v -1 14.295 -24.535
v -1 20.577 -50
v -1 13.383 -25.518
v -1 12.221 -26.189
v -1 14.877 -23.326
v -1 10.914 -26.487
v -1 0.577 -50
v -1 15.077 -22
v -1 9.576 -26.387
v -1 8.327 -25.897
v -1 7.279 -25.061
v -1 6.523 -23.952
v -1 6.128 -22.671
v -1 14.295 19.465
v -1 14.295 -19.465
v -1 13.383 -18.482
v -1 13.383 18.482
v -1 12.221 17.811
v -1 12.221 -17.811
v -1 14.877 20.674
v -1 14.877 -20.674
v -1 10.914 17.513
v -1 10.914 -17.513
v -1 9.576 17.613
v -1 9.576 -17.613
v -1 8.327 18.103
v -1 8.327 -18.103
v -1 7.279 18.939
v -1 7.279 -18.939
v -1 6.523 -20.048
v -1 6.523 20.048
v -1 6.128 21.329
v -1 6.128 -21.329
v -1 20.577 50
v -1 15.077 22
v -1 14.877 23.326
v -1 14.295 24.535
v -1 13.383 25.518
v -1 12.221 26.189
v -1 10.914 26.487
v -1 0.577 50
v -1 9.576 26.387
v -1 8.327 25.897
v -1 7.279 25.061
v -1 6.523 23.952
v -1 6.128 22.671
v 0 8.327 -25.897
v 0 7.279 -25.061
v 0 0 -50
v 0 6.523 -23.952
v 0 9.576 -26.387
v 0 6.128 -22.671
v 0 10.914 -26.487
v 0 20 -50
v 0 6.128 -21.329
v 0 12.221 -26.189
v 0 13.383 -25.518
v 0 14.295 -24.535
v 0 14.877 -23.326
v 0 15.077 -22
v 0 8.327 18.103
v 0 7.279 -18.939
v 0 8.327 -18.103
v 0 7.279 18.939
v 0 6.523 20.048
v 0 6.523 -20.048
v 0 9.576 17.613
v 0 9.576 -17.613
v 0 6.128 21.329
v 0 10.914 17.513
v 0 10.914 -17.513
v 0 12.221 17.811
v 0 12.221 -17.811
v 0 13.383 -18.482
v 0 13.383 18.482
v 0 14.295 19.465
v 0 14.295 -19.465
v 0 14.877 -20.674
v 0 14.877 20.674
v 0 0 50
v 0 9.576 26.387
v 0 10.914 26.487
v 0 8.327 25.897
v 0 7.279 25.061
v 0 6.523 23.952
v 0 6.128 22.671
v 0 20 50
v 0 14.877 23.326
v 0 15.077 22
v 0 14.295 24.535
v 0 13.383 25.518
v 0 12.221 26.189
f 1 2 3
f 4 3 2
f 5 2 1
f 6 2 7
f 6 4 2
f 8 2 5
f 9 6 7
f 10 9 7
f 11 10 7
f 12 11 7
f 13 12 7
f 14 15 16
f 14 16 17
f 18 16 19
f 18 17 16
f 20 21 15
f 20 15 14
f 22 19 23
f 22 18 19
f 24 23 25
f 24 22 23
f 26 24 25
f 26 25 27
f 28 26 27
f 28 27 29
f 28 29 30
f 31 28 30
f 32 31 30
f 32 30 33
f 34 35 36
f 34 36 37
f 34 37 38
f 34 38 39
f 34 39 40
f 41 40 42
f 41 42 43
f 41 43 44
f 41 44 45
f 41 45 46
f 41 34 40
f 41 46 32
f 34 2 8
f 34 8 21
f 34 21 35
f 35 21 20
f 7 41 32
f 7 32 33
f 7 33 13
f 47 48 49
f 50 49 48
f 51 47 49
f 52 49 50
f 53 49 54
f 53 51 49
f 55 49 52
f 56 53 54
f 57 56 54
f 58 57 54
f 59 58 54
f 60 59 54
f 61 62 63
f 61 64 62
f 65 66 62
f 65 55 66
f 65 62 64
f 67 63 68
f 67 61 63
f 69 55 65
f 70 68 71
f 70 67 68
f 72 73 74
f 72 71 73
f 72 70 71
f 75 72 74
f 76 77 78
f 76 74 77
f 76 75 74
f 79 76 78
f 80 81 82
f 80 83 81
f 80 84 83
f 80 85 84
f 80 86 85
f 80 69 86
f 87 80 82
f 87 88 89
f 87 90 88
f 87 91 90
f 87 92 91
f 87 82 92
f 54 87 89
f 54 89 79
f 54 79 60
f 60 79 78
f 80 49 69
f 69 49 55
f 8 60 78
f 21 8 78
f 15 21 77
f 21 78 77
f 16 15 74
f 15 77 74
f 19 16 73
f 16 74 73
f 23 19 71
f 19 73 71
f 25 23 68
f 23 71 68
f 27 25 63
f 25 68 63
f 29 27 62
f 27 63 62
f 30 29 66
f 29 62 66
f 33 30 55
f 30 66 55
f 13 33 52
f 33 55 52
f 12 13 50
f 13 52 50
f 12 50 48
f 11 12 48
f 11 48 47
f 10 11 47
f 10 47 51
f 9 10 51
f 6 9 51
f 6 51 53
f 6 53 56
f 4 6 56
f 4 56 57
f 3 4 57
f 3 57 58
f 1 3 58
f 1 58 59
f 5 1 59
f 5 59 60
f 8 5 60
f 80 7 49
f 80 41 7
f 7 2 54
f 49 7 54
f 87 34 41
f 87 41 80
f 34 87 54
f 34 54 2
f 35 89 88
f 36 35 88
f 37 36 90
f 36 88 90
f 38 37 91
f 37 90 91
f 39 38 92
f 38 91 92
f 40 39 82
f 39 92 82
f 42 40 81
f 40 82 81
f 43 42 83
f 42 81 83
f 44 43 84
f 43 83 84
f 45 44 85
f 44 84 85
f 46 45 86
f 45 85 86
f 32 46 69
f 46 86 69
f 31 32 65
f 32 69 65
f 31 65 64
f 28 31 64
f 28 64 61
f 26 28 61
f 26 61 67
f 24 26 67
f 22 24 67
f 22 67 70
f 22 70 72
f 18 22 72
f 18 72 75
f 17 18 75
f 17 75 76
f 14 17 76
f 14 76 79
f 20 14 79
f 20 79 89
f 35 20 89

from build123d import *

# Parameters (mm, degrees)
SALIENTE_EXTRUIR2_DEPTH          = 50
TALADRO_DE_MARGEN_PARA_M82_D     = 9
TALADRO_DE_MARGEN_PARA_M82_DEPTH = 10
TALADRO_DE_MARGEN_PARA_M82_TIP   = 2.703872786


with BuildPart() as part:
    # Croquis3 → Saliente-Extruir2 (new, symmetric)
    with BuildSketch(Plane.XY):
        Polygon((0, 0), (0, 20), (-1, 20.577350269), (-1, 0.577350269), align=None)
    extrude(amount=SALIENTE_EXTRUIR2_DEPTH, both=True)

    # Taladro de margen para M82
    with Locations(Plane(origin=(-1, 10.577350269, -22), x_dir=(0, -1, 0), z_dir=(-1, 0, 0))):
        with Locations((0, 0), (0, 44)):
            Hole(TALADRO_DE_MARGEN_PARA_M82_D / 2, depth=TALADRO_DE_MARGEN_PARA_M82_DEPTH)
            with Locations((0, 0, -(TALADRO_DE_MARGEN_PARA_M82_DEPTH + TALADRO_DE_MARGEN_PARA_M82_TIP / 2))):  # 118° drill point
                Cone(0, TALADRO_DE_MARGEN_PARA_M82_D / 2, TALADRO_DE_MARGEN_PARA_M82_TIP, mode=Mode.SUBTRACT)


solid = part.part
